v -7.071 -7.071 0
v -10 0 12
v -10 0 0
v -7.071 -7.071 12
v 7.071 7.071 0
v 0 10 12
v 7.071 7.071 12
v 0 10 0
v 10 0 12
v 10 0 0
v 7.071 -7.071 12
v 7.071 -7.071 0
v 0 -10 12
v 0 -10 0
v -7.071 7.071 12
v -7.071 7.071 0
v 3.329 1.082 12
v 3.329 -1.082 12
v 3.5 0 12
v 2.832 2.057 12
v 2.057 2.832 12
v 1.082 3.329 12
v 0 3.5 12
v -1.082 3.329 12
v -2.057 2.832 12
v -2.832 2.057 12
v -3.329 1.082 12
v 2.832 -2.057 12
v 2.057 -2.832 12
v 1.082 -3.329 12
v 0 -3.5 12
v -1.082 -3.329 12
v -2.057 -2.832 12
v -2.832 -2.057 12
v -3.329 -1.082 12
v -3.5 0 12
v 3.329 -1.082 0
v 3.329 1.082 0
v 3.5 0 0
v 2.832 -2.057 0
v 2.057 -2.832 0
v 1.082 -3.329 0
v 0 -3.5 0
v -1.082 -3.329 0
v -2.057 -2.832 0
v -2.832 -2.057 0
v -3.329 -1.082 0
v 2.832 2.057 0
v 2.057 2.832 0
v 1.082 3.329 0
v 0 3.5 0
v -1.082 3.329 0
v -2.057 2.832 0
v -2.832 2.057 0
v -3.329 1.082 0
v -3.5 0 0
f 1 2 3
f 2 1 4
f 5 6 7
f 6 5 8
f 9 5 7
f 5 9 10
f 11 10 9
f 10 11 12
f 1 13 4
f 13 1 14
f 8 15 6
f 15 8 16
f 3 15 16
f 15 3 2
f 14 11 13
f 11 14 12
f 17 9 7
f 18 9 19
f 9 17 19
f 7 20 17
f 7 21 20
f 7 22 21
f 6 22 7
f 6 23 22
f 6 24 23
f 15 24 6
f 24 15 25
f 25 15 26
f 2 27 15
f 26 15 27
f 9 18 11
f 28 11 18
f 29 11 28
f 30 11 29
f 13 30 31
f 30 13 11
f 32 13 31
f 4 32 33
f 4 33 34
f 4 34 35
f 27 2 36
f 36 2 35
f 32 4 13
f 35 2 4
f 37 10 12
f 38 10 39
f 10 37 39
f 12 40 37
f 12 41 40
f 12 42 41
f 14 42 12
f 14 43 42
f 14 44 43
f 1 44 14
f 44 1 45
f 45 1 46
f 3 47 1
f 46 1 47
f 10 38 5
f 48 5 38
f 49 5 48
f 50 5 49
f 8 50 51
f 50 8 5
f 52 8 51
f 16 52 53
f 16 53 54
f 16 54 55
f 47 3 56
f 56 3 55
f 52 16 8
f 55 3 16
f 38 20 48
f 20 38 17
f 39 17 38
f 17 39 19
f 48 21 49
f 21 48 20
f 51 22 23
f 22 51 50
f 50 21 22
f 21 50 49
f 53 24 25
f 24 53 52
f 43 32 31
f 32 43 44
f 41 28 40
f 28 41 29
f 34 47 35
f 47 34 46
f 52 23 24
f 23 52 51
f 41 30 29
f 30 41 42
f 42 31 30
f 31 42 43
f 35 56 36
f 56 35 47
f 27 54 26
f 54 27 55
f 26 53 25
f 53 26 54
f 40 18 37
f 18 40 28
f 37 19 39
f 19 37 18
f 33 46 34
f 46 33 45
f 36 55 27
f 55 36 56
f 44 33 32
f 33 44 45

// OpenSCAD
h = 12;
od = 20;
id = 7;
$fn=10;


difference(){
    cylinder(h=h, d=od, $fn=8);
    cylinder(h=h, d=id, $fn=20);
}
